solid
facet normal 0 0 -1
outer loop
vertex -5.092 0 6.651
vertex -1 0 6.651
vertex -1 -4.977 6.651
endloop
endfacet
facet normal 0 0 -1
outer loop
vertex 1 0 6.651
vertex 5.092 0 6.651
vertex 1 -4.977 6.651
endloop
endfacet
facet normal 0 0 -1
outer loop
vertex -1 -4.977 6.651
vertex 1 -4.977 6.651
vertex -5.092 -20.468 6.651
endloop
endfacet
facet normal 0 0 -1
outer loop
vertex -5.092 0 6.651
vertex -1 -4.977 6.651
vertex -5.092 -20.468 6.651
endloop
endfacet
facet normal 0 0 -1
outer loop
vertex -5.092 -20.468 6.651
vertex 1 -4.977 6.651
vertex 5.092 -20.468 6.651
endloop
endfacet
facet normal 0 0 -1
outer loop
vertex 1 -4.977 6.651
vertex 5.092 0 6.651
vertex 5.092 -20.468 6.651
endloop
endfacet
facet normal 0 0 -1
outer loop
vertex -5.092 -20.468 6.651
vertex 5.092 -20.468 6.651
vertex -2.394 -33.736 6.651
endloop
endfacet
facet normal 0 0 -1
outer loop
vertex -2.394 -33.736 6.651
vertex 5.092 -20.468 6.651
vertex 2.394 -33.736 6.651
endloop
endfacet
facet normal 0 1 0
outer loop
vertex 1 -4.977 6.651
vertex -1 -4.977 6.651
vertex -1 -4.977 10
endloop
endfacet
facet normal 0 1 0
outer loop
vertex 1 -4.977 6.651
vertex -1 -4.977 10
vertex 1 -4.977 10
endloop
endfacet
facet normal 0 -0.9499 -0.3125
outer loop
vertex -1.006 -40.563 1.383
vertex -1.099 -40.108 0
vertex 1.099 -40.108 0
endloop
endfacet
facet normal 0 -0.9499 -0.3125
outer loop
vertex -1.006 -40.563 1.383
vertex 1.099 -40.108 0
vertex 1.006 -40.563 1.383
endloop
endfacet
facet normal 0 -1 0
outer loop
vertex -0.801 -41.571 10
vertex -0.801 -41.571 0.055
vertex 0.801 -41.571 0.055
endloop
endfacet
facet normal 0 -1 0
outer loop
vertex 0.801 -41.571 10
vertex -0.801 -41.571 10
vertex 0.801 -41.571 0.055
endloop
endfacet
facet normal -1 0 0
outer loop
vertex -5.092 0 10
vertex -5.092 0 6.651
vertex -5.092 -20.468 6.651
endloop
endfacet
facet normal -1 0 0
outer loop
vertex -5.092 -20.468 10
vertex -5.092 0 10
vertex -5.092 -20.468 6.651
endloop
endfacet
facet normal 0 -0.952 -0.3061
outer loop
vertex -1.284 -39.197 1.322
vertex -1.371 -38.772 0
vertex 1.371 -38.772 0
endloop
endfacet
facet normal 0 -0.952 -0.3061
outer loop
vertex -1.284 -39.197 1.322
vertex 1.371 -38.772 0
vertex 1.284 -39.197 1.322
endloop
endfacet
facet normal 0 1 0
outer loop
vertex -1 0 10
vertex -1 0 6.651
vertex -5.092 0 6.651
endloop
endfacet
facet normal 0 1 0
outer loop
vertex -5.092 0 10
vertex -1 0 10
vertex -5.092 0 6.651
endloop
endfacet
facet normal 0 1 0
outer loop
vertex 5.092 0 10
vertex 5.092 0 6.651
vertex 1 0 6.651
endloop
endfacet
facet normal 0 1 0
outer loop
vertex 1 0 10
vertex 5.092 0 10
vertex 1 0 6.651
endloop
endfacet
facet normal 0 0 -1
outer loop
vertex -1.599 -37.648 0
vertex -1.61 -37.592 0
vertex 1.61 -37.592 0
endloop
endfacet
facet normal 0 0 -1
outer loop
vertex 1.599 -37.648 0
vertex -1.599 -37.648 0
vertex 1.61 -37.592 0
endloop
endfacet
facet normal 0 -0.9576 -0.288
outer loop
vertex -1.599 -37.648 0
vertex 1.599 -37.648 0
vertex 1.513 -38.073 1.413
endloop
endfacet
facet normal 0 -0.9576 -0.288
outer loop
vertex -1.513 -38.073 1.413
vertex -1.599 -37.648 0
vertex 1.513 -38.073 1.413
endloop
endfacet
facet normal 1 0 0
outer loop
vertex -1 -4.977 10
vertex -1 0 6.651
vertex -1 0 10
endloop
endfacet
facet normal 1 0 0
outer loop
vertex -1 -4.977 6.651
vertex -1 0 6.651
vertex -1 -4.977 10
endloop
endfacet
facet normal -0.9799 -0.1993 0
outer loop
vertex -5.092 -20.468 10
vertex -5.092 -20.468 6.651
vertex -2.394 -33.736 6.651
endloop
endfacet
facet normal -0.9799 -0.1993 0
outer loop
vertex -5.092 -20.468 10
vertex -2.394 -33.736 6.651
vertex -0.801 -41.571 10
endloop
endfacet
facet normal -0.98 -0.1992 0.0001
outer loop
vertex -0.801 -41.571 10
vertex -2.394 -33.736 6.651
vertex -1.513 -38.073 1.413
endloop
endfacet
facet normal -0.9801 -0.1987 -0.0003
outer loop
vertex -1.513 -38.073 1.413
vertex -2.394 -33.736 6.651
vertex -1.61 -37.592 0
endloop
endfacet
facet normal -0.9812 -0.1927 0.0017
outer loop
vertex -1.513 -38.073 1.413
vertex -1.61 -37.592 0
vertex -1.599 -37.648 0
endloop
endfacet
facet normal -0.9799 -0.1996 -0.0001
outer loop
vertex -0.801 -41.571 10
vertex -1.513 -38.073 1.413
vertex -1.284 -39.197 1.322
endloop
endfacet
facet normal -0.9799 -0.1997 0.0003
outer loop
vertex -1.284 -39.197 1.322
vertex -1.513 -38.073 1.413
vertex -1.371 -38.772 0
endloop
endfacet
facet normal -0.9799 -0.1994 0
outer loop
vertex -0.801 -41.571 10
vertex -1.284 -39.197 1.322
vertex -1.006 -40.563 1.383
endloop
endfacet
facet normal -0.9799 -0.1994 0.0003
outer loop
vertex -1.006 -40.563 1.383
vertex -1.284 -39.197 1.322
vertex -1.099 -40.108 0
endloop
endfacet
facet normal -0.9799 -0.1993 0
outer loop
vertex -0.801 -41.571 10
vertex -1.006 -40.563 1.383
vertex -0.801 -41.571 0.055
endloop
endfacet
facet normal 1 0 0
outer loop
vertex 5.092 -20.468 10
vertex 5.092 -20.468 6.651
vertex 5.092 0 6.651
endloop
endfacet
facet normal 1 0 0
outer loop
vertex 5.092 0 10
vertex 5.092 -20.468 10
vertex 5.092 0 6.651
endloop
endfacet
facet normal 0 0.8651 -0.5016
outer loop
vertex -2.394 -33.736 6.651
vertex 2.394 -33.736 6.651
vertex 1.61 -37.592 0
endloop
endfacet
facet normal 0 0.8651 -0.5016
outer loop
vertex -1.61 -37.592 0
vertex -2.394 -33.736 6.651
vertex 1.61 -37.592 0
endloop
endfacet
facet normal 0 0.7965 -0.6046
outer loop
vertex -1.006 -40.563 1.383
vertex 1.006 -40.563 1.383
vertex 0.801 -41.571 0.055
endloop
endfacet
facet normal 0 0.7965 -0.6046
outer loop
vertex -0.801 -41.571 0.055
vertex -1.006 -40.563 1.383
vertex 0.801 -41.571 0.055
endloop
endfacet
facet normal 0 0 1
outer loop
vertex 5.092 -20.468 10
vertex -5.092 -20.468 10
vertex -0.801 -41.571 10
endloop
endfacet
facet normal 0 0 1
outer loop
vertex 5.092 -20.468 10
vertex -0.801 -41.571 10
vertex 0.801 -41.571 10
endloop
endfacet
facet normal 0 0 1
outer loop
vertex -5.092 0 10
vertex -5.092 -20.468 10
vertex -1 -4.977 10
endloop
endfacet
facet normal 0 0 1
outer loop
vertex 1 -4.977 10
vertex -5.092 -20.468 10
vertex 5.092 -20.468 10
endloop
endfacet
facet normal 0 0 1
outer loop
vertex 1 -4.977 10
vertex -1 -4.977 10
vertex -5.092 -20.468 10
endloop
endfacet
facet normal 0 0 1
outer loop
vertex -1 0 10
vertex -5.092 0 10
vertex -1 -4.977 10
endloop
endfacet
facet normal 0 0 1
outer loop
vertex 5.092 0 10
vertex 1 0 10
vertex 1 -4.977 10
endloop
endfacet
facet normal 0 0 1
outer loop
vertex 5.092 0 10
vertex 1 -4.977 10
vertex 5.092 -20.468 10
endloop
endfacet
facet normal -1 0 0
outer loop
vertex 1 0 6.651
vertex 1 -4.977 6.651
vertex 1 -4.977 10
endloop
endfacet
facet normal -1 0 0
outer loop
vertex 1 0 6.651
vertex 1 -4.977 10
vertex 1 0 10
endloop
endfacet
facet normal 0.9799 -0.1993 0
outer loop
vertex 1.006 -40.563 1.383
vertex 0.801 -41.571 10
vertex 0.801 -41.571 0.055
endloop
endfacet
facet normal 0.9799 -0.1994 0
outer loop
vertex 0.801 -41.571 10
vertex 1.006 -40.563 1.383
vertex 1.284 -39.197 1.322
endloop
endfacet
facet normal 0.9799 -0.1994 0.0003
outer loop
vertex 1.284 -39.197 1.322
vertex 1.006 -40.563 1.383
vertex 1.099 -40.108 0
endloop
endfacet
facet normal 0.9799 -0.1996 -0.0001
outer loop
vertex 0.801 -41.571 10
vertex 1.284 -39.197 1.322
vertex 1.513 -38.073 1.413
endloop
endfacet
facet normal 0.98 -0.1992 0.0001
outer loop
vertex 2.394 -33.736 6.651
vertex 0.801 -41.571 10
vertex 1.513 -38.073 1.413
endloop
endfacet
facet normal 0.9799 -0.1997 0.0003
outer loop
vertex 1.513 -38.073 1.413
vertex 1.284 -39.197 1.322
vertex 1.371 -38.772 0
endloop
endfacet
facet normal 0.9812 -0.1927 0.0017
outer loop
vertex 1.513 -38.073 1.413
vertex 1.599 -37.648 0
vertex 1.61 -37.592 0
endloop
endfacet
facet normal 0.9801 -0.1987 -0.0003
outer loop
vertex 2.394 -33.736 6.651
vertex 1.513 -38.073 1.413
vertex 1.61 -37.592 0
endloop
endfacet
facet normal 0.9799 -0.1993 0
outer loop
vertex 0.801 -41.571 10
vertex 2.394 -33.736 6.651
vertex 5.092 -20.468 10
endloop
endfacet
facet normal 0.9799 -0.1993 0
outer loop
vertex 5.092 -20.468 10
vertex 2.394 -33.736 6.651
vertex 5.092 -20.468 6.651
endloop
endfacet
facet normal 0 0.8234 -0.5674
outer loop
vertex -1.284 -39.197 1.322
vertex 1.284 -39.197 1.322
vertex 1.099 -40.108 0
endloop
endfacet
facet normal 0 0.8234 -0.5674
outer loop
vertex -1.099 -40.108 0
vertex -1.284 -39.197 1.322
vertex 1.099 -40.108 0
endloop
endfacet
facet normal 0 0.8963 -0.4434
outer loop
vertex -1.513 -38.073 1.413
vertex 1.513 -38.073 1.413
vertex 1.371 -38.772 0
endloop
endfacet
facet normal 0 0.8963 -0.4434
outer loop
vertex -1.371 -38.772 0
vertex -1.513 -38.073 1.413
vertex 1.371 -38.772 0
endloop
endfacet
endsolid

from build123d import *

# Parameters (mm, degrees)
F1_DEPTH = 10
F3_DEPTH = 12.5
F5_DEPTH = 12.5
F7_DEPTH = 74


with BuildPart() as f1:
    # F0 (on Top) → F1 (new body)
    with BuildSketch(Plane.XY):
        Polygon((0, -41.570846), (0, 0), (-5.092436, 0), (-5.092436, -20.467674), (-0.80141, -41.570846), align=None)
        Polygon((5.092436, 0), (0, 0), (0, -41.570846), (0.80141, -41.570846), (5.092436, -20.467674), align=None)
    extrude(amount=F1_DEPTH)

    # F2 (on Right) → F3 (cut, symmetric)
    with BuildSketch(Plane.YZ):
        Polygon((-37.5918, -12.62699), (0, -8.964199), (0, 6.650857), (-33.736233, 6.650857), (-37.5918, 0), align=None)
    extrude(amount=F3_DEPTH, both=True, mode=Mode.SUBTRACT)

    # F4 (on Right) → F5 (cut, symmetric)
    with BuildSketch(Plane.YZ):
        Polygon((-40.562909, 1.382743), (-41.8077, -0.256735), (-43.113209, -1.562245), (-35.917722, -1.926574), (-37.648283, 0), (-38.073331, 1.413104), (-38.771629, 0), (-39.196678, 1.322022), (-40.1075, 0), align=None)
    extrude(amount=F5_DEPTH, both=True, mode=Mode.SUBTRACT)

    # F6 (on Top) → F7 (cut)
    with BuildSketch(Plane.XY):
        Polygon((1, 4.449242), (0, 4.449242), (0, -4.97661), (1, -4.97661), (1, 0), align=None)
        Polygon((0, -4.97661), (0, 4.449242), (-1, 4.449242), (-1, 0), (-1, -4.97661), align=None)
    extrude(amount=F7_DEPTH, mode=Mode.SUBTRACT)


solid = f1.part
